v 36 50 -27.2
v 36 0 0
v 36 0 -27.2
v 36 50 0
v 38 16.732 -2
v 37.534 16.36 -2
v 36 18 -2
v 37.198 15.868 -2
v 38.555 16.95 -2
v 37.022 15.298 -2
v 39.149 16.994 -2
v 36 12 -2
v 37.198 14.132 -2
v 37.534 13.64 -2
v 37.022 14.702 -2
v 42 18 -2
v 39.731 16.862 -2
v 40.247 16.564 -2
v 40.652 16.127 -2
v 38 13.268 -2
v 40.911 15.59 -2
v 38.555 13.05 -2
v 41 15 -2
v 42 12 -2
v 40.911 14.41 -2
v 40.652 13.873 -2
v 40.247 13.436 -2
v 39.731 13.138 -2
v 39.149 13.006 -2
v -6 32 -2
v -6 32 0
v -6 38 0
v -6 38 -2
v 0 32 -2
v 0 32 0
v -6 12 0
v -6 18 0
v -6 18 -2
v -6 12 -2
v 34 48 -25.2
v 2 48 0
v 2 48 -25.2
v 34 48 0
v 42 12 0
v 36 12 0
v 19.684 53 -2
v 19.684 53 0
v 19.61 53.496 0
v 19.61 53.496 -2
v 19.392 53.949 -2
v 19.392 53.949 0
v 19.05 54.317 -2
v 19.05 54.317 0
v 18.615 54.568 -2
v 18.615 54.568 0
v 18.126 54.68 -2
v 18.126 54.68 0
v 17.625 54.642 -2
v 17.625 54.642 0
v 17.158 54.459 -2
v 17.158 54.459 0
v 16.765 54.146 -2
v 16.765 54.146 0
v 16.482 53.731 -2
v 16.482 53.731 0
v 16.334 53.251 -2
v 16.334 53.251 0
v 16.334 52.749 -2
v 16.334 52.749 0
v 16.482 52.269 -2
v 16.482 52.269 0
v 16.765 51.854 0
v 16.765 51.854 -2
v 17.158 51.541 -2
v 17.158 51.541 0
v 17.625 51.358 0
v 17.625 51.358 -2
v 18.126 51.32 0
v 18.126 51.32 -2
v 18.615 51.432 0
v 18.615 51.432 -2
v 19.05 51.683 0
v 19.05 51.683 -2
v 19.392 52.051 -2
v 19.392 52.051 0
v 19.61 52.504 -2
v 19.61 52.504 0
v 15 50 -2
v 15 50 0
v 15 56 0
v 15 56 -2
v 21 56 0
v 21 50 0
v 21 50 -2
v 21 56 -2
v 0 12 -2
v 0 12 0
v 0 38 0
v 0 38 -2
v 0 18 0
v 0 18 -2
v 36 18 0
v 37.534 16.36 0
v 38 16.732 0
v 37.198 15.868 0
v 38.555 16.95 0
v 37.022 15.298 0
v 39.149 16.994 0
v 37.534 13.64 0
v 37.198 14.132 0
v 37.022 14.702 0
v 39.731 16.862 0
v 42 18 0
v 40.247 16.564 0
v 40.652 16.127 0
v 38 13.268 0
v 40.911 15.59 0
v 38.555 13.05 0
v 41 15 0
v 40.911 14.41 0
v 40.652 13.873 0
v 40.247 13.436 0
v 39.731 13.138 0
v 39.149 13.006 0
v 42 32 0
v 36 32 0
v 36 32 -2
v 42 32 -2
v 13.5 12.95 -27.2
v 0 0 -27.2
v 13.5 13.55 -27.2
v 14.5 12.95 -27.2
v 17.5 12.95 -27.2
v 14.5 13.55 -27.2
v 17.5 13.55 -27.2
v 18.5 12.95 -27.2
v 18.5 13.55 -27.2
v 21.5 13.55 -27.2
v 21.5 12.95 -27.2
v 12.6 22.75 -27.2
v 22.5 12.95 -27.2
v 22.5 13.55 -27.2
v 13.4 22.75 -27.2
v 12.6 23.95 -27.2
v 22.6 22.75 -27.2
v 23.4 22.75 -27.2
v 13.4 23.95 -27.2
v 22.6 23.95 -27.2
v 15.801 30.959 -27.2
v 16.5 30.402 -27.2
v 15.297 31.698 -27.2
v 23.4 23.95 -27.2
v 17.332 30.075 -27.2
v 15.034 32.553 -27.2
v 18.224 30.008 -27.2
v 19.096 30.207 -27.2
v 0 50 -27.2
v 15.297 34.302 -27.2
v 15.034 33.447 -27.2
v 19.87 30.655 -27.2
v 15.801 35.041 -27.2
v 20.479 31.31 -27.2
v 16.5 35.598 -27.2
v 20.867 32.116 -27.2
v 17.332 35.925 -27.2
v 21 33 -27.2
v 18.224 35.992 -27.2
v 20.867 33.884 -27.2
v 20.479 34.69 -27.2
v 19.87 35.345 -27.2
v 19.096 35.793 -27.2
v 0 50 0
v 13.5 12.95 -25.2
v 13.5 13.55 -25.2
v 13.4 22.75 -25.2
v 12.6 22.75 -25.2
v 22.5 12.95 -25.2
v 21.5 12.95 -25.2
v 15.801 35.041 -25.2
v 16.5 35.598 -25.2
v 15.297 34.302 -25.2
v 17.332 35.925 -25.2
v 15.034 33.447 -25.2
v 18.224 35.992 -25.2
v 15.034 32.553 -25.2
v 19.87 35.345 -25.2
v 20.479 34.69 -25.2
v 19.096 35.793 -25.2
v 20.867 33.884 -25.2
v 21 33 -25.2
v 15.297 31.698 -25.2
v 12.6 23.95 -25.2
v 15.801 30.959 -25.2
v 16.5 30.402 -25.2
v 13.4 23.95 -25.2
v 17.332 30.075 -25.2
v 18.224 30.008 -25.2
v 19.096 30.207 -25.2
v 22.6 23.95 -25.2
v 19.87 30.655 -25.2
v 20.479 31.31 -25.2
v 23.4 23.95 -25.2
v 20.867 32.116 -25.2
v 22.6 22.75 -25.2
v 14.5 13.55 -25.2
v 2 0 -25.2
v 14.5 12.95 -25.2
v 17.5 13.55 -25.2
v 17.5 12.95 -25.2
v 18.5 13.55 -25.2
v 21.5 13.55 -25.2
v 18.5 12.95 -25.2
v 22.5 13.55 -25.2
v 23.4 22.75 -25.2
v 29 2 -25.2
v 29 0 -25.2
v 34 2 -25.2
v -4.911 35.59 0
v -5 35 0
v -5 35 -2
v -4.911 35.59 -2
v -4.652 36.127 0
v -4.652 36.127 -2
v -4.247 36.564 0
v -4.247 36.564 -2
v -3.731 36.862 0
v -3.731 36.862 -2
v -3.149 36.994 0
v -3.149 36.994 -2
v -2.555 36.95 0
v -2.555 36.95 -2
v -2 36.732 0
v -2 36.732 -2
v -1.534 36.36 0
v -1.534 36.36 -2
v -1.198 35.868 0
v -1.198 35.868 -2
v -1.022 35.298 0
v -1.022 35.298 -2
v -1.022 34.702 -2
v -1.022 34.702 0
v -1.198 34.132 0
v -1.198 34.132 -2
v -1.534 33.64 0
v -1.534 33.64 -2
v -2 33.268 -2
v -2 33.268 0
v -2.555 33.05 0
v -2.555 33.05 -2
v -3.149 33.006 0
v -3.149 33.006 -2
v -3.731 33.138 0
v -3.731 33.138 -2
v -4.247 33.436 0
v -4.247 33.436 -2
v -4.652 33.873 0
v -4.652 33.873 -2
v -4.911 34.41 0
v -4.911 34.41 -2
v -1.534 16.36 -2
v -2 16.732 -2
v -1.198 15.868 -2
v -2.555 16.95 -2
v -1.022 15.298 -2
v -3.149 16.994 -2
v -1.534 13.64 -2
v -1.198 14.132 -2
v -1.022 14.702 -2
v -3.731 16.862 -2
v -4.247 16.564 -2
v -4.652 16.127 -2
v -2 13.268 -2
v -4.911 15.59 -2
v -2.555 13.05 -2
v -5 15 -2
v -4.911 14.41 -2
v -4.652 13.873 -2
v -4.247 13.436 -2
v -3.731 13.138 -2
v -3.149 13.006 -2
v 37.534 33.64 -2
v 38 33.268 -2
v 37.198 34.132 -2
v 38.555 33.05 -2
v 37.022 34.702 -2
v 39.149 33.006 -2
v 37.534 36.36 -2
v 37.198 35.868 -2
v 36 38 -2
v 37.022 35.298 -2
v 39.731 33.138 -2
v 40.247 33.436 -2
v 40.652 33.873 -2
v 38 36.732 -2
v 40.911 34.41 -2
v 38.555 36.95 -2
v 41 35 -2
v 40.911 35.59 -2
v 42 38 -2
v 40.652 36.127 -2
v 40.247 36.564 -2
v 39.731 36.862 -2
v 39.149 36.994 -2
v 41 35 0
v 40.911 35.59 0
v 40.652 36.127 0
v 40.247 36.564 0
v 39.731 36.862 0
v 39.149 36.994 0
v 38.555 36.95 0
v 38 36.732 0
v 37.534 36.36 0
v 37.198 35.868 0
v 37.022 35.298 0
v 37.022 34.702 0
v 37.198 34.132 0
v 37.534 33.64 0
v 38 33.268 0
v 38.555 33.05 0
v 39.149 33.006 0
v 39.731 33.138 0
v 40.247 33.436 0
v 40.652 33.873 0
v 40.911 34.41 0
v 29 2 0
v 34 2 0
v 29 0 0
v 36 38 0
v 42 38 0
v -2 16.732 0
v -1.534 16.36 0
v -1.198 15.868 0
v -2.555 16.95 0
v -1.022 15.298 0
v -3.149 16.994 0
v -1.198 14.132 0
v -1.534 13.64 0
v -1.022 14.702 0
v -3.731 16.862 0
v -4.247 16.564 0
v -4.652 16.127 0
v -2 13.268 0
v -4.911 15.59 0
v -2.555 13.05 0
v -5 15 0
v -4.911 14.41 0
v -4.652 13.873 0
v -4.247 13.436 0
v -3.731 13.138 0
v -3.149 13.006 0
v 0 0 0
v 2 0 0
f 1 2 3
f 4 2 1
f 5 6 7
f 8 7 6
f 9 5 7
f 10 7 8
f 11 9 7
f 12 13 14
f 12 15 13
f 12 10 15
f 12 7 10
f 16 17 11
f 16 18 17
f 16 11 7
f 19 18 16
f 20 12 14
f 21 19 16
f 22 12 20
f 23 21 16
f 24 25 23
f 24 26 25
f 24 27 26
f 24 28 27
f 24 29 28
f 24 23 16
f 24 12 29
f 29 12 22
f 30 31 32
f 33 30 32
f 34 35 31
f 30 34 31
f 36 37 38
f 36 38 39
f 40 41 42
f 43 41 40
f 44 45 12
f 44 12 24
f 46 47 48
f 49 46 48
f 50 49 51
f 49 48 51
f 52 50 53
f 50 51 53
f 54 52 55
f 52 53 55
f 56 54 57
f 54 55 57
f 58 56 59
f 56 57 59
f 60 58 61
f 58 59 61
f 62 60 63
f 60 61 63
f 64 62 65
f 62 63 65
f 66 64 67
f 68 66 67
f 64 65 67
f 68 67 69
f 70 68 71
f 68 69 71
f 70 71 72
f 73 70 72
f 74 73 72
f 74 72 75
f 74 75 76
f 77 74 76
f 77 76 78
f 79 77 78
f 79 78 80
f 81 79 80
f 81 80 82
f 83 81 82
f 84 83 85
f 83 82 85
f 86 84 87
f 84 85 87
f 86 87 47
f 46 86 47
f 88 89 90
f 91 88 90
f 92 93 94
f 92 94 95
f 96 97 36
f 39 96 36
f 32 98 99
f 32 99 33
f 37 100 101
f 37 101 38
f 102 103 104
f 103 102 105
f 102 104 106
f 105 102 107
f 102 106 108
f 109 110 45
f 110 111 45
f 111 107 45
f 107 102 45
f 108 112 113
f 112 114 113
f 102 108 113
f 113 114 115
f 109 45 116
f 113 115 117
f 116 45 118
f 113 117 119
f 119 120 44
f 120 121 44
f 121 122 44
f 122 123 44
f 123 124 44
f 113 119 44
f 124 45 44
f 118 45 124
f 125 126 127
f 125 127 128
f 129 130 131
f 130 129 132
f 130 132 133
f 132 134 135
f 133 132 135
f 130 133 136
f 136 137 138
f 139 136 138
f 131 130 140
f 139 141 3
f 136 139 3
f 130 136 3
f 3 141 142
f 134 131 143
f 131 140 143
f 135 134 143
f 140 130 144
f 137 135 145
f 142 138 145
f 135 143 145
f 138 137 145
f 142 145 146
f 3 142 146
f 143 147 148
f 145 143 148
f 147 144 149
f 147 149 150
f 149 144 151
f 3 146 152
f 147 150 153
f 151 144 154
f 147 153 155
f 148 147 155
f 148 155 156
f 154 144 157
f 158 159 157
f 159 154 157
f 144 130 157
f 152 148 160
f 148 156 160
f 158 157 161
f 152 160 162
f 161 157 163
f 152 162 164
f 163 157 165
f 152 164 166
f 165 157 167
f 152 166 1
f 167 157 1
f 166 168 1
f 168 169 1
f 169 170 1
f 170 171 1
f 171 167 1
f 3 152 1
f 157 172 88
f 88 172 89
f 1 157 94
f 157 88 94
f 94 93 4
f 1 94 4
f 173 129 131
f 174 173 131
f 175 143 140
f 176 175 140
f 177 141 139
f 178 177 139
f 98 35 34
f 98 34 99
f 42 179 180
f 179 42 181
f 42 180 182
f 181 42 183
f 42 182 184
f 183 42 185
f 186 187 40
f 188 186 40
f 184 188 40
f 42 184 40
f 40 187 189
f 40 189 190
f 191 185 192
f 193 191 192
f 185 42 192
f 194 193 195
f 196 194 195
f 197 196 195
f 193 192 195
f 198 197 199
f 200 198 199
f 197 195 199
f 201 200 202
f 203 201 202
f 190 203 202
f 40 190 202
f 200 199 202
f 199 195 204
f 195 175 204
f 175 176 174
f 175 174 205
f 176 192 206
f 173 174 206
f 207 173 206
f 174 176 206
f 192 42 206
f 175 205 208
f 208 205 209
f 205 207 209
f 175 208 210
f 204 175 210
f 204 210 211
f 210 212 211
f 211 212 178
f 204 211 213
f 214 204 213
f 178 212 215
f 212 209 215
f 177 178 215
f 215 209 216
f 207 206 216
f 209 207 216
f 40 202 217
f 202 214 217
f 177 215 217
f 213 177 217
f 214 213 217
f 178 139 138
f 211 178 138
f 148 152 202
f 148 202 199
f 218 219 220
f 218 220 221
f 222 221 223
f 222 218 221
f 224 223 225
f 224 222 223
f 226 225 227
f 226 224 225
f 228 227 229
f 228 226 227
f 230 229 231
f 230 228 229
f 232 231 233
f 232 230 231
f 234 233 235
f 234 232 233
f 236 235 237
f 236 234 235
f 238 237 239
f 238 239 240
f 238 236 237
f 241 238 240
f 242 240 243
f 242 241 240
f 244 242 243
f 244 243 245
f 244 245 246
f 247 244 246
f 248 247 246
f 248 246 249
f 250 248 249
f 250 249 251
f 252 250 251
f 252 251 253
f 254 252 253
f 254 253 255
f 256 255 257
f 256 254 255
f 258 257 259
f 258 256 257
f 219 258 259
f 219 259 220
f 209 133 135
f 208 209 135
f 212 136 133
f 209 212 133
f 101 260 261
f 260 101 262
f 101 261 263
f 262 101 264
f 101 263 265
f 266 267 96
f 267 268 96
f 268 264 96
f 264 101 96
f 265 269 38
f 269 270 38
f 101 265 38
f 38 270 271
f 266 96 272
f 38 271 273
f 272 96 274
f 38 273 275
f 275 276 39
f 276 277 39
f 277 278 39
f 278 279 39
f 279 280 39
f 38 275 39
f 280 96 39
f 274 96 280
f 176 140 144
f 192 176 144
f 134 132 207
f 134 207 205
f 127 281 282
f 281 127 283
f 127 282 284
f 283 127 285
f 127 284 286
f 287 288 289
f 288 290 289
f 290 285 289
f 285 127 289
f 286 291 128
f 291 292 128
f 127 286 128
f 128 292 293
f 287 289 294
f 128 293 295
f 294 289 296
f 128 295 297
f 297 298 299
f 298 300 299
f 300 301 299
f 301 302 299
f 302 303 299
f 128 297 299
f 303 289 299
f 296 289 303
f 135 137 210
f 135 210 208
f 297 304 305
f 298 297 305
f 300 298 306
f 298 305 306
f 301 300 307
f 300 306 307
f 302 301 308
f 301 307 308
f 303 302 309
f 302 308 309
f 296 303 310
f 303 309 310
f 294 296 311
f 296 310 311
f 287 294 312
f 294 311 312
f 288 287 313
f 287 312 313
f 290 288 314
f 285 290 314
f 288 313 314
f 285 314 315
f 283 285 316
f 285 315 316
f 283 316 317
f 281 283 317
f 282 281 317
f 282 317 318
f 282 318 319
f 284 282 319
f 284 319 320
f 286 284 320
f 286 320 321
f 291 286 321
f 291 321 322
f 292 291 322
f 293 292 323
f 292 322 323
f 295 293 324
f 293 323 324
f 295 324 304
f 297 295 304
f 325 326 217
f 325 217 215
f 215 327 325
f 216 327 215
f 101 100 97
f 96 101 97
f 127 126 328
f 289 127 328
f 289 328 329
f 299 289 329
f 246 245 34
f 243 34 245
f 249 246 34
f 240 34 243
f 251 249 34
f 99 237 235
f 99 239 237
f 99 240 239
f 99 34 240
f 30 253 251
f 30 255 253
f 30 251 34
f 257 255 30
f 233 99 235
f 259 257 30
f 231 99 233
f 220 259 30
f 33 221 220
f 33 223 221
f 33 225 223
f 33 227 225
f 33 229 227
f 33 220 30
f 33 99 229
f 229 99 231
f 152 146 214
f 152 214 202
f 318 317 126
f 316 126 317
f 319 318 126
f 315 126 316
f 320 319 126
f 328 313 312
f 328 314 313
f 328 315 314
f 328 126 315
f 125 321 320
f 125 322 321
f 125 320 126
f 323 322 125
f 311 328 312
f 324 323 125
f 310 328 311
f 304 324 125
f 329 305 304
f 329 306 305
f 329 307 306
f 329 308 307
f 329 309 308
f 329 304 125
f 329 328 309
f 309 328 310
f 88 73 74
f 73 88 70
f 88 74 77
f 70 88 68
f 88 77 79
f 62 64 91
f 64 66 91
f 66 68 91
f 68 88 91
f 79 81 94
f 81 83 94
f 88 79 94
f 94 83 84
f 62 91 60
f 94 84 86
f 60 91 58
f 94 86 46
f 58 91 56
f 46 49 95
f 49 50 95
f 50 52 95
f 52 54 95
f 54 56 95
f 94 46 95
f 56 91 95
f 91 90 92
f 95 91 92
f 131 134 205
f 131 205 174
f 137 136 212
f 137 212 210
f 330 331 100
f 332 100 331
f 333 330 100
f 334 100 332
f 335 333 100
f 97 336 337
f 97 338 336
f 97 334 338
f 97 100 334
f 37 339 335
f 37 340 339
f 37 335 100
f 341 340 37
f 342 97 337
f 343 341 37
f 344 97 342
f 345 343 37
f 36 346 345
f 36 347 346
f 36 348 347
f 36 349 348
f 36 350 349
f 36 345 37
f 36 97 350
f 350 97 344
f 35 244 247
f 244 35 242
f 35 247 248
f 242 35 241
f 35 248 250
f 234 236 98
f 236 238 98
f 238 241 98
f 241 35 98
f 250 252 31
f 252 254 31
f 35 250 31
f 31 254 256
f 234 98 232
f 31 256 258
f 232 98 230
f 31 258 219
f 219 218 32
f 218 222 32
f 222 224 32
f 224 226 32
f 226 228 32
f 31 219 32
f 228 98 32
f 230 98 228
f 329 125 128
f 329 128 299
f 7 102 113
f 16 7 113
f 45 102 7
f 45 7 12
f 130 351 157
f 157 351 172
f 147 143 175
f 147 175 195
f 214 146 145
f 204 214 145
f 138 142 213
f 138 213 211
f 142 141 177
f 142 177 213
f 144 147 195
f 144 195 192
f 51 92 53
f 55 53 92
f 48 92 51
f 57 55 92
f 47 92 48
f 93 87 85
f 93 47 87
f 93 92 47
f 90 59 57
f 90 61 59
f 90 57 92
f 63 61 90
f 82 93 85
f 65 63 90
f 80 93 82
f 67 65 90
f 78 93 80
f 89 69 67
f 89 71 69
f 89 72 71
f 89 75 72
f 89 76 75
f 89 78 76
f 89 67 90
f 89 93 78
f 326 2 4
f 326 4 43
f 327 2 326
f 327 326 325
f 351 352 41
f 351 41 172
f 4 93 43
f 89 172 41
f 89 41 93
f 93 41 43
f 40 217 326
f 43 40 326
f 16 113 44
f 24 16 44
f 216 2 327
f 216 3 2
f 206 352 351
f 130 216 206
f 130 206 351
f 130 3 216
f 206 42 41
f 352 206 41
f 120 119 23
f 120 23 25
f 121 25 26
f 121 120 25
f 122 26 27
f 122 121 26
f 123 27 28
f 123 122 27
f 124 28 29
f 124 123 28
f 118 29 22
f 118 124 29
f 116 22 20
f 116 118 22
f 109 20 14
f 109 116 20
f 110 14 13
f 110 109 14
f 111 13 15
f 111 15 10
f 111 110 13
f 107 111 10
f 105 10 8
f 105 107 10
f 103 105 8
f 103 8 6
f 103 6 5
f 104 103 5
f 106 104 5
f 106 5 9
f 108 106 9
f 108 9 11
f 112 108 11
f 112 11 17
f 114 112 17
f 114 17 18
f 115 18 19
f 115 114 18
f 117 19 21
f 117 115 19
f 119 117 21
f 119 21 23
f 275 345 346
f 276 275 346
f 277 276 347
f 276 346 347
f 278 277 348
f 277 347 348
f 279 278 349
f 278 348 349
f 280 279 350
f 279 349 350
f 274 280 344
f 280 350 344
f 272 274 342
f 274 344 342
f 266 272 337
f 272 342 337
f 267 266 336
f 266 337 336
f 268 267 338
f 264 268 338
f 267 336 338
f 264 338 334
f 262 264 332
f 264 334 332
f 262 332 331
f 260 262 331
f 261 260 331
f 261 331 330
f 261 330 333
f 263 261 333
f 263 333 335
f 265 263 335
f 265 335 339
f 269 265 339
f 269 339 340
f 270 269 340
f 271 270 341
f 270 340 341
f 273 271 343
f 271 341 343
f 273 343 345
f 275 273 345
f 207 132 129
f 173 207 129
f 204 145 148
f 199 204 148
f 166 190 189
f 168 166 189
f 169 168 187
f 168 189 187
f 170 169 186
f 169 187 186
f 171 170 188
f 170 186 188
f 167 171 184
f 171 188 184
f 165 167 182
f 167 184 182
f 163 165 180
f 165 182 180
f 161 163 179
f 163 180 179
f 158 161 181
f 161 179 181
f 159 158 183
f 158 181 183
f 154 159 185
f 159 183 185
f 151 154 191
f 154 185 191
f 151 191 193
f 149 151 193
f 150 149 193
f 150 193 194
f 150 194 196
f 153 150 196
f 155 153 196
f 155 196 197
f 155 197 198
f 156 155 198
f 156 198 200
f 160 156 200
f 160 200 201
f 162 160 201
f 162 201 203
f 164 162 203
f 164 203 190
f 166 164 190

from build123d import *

# Parameters (mm, degrees)
SKETCH1_W           = 36
SKETCH1_H           = 50
BOSS_EXTRUDE1_DEPTH = 27.2
CUT_EXTRUDE1_REACH  = 69.349
SKETCH2_R           = 3
SKETCH8_W           = 32
SKETCH8_H           = 46
CUT_EXTRUDE2_DEPTH  = 25.2
SKETCH12_W          = 1
SKETCH12_H          = 0.6
SKETCH12_W_2        = 0.8
SKETCH12_H_2        = 1.2
CUT_EXTRUDE3_DEPTH  = 25.2
SKETCH14_W          = 32
SKETCH14_H          = 25.2
CUT_EXTRUDE4_DEPTH  = 25.2
SKETCH16_W          = 5
SKETCH16_H          = 25.2
BOSS_EXTRUDE2_DEPTH = 2
SKETCH17_W          = 6
SKETCH17_H          = 6
BOSS_EXTRUDE3_DEPTH = 2
SKETCH18_R          = 2
CUT_EXTRUDE5_DEPTH  = 2
SKETCH20_W          = 6
SKETCH20_H          = 6
BOSS_EXTRUDE4_DEPTH = 2
SKETCH21_R          = 1.684389361
CUT_EXTRUDE6_DEPTH  = 2


with BuildPart() as part:
    # Sketch1 → Boss-Extrude1 (new body)
    with BuildSketch(Plane.XY):
        with Locations((18, 25)):
            Rectangle(SKETCH1_W, SKETCH1_H)
    extrude(amount=-BOSS_EXTRUDE1_DEPTH)

    # Sketch2 → Cut-Extrude1 (cut, up to next)
    with BuildSketch(Plane.XY, mode=Mode.PRIVATE) as cut_extrude1_sk1:
        with Locations((18, 33)):
            Circle(SKETCH2_R)
    cut_extrude1_tool1 = extrude(cut_extrude1_sk1.sketch, amount=-CUT_EXTRUDE1_REACH, mode=Mode.PRIVATE) & part.part
    add(cut_extrude1_tool1.solids().sort_by_distance((18, 33, 0))[0], mode=Mode.SUBTRACT)

    # Sketch8 → Cut-Extrude2 (cut)
    with BuildSketch(Plane.XY):
        with Locations((18, 25)):
            Rectangle(SKETCH8_W, SKETCH8_H)
    extrude(amount=-CUT_EXTRUDE2_DEPTH, mode=Mode.SUBTRACT)

    # Sketch12 → Cut-Extrude3 (cut)
    with BuildSketch(Plane(origin=(0, 0, -27.2), x_dir=(-1, 0, 0), z_dir=(0, 0, -1))):
        with Locations((-14, 13.25)):
            Rectangle(SKETCH12_W, SKETCH12_H)
        with Locations((-18, 13.25)):
            Rectangle(SKETCH12_W, SKETCH12_H)
        with Locations((-22, 13.25)):
            Rectangle(SKETCH12_W, SKETCH12_H)
        with Locations((-13, 23.35)):
            Rectangle(SKETCH12_W_2, SKETCH12_H_2)
        with Locations((-23, 23.35)):
            Rectangle(SKETCH12_W_2, SKETCH12_H_2)
    extrude(amount=-CUT_EXTRUDE3_DEPTH, mode=Mode.SUBTRACT)

    # Sketch14 → Cut-Extrude4 (cut)
    with BuildSketch(Plane.XZ):
        with Locations((18, -12.6)):
            Rectangle(SKETCH14_W, SKETCH14_H)
    extrude(amount=-CUT_EXTRUDE4_DEPTH, mode=Mode.SUBTRACT)

    # Sketch16 → Boss-Extrude2 (add)
    with BuildSketch(Plane(origin=(0, 0, 0), x_dir=(-1, 0, 0), z_dir=(0, -1, 0))):
        with Locations((-31.5, 12.6)):
            Rectangle(SKETCH16_W, SKETCH16_H)
    extrude(amount=-BOSS_EXTRUDE2_DEPTH)

    # Sketch20 → Boss-Extrude4 (add)
    with BuildSketch(Plane.XY):
        with Locations((18, 53)):
            Rectangle(SKETCH20_W, SKETCH20_H)
    extrude(amount=-BOSS_EXTRUDE4_DEPTH)

    # Sketch21 → Cut-Extrude6 (cut)
    with BuildSketch(Plane.XY):
        with Locations((18, 53)):
            Circle(SKETCH21_R)
    extrude(amount=-CUT_EXTRUDE6_DEPTH, mode=Mode.SUBTRACT)


with BuildPart() as body_2:
    # Sketch17 → Boss-Extrude3 (new body)
    with BuildSketch(Plane.XY):
        with Locations((39, 35)):
            Rectangle(SKETCH17_W, SKETCH17_H)
    extrude(amount=-BOSS_EXTRUDE3_DEPTH)

    # Sketch18 → Cut-Extrude5 (cut)
    with BuildSketch(Plane.XY):
        with Locations((39, 35)):
            Circle(SKETCH18_R)
    extrude(amount=-CUT_EXTRUDE5_DEPTH, mode=Mode.SUBTRACT)


with BuildPart() as body_3:
    # Mirror1: mirrored copy
    add(body_2.part.mirror(Plane(origin=(0, 25, 0), x_dir=(0, 0, 1), z_dir=(0, -1, 0))))


with BuildPart() as body_4:
    # Mirror2: mirrored copy
    add(body_2.part.mirror(Plane.ZY.offset(-18)))


with BuildPart() as body_5:
    # Mirror2 2: mirrored copy
    add(body_3.part.mirror(Plane.ZY.offset(-18)))


solid = Compound([part.part, body_2.part, body_3.part, body_4.part, body_5.part])
